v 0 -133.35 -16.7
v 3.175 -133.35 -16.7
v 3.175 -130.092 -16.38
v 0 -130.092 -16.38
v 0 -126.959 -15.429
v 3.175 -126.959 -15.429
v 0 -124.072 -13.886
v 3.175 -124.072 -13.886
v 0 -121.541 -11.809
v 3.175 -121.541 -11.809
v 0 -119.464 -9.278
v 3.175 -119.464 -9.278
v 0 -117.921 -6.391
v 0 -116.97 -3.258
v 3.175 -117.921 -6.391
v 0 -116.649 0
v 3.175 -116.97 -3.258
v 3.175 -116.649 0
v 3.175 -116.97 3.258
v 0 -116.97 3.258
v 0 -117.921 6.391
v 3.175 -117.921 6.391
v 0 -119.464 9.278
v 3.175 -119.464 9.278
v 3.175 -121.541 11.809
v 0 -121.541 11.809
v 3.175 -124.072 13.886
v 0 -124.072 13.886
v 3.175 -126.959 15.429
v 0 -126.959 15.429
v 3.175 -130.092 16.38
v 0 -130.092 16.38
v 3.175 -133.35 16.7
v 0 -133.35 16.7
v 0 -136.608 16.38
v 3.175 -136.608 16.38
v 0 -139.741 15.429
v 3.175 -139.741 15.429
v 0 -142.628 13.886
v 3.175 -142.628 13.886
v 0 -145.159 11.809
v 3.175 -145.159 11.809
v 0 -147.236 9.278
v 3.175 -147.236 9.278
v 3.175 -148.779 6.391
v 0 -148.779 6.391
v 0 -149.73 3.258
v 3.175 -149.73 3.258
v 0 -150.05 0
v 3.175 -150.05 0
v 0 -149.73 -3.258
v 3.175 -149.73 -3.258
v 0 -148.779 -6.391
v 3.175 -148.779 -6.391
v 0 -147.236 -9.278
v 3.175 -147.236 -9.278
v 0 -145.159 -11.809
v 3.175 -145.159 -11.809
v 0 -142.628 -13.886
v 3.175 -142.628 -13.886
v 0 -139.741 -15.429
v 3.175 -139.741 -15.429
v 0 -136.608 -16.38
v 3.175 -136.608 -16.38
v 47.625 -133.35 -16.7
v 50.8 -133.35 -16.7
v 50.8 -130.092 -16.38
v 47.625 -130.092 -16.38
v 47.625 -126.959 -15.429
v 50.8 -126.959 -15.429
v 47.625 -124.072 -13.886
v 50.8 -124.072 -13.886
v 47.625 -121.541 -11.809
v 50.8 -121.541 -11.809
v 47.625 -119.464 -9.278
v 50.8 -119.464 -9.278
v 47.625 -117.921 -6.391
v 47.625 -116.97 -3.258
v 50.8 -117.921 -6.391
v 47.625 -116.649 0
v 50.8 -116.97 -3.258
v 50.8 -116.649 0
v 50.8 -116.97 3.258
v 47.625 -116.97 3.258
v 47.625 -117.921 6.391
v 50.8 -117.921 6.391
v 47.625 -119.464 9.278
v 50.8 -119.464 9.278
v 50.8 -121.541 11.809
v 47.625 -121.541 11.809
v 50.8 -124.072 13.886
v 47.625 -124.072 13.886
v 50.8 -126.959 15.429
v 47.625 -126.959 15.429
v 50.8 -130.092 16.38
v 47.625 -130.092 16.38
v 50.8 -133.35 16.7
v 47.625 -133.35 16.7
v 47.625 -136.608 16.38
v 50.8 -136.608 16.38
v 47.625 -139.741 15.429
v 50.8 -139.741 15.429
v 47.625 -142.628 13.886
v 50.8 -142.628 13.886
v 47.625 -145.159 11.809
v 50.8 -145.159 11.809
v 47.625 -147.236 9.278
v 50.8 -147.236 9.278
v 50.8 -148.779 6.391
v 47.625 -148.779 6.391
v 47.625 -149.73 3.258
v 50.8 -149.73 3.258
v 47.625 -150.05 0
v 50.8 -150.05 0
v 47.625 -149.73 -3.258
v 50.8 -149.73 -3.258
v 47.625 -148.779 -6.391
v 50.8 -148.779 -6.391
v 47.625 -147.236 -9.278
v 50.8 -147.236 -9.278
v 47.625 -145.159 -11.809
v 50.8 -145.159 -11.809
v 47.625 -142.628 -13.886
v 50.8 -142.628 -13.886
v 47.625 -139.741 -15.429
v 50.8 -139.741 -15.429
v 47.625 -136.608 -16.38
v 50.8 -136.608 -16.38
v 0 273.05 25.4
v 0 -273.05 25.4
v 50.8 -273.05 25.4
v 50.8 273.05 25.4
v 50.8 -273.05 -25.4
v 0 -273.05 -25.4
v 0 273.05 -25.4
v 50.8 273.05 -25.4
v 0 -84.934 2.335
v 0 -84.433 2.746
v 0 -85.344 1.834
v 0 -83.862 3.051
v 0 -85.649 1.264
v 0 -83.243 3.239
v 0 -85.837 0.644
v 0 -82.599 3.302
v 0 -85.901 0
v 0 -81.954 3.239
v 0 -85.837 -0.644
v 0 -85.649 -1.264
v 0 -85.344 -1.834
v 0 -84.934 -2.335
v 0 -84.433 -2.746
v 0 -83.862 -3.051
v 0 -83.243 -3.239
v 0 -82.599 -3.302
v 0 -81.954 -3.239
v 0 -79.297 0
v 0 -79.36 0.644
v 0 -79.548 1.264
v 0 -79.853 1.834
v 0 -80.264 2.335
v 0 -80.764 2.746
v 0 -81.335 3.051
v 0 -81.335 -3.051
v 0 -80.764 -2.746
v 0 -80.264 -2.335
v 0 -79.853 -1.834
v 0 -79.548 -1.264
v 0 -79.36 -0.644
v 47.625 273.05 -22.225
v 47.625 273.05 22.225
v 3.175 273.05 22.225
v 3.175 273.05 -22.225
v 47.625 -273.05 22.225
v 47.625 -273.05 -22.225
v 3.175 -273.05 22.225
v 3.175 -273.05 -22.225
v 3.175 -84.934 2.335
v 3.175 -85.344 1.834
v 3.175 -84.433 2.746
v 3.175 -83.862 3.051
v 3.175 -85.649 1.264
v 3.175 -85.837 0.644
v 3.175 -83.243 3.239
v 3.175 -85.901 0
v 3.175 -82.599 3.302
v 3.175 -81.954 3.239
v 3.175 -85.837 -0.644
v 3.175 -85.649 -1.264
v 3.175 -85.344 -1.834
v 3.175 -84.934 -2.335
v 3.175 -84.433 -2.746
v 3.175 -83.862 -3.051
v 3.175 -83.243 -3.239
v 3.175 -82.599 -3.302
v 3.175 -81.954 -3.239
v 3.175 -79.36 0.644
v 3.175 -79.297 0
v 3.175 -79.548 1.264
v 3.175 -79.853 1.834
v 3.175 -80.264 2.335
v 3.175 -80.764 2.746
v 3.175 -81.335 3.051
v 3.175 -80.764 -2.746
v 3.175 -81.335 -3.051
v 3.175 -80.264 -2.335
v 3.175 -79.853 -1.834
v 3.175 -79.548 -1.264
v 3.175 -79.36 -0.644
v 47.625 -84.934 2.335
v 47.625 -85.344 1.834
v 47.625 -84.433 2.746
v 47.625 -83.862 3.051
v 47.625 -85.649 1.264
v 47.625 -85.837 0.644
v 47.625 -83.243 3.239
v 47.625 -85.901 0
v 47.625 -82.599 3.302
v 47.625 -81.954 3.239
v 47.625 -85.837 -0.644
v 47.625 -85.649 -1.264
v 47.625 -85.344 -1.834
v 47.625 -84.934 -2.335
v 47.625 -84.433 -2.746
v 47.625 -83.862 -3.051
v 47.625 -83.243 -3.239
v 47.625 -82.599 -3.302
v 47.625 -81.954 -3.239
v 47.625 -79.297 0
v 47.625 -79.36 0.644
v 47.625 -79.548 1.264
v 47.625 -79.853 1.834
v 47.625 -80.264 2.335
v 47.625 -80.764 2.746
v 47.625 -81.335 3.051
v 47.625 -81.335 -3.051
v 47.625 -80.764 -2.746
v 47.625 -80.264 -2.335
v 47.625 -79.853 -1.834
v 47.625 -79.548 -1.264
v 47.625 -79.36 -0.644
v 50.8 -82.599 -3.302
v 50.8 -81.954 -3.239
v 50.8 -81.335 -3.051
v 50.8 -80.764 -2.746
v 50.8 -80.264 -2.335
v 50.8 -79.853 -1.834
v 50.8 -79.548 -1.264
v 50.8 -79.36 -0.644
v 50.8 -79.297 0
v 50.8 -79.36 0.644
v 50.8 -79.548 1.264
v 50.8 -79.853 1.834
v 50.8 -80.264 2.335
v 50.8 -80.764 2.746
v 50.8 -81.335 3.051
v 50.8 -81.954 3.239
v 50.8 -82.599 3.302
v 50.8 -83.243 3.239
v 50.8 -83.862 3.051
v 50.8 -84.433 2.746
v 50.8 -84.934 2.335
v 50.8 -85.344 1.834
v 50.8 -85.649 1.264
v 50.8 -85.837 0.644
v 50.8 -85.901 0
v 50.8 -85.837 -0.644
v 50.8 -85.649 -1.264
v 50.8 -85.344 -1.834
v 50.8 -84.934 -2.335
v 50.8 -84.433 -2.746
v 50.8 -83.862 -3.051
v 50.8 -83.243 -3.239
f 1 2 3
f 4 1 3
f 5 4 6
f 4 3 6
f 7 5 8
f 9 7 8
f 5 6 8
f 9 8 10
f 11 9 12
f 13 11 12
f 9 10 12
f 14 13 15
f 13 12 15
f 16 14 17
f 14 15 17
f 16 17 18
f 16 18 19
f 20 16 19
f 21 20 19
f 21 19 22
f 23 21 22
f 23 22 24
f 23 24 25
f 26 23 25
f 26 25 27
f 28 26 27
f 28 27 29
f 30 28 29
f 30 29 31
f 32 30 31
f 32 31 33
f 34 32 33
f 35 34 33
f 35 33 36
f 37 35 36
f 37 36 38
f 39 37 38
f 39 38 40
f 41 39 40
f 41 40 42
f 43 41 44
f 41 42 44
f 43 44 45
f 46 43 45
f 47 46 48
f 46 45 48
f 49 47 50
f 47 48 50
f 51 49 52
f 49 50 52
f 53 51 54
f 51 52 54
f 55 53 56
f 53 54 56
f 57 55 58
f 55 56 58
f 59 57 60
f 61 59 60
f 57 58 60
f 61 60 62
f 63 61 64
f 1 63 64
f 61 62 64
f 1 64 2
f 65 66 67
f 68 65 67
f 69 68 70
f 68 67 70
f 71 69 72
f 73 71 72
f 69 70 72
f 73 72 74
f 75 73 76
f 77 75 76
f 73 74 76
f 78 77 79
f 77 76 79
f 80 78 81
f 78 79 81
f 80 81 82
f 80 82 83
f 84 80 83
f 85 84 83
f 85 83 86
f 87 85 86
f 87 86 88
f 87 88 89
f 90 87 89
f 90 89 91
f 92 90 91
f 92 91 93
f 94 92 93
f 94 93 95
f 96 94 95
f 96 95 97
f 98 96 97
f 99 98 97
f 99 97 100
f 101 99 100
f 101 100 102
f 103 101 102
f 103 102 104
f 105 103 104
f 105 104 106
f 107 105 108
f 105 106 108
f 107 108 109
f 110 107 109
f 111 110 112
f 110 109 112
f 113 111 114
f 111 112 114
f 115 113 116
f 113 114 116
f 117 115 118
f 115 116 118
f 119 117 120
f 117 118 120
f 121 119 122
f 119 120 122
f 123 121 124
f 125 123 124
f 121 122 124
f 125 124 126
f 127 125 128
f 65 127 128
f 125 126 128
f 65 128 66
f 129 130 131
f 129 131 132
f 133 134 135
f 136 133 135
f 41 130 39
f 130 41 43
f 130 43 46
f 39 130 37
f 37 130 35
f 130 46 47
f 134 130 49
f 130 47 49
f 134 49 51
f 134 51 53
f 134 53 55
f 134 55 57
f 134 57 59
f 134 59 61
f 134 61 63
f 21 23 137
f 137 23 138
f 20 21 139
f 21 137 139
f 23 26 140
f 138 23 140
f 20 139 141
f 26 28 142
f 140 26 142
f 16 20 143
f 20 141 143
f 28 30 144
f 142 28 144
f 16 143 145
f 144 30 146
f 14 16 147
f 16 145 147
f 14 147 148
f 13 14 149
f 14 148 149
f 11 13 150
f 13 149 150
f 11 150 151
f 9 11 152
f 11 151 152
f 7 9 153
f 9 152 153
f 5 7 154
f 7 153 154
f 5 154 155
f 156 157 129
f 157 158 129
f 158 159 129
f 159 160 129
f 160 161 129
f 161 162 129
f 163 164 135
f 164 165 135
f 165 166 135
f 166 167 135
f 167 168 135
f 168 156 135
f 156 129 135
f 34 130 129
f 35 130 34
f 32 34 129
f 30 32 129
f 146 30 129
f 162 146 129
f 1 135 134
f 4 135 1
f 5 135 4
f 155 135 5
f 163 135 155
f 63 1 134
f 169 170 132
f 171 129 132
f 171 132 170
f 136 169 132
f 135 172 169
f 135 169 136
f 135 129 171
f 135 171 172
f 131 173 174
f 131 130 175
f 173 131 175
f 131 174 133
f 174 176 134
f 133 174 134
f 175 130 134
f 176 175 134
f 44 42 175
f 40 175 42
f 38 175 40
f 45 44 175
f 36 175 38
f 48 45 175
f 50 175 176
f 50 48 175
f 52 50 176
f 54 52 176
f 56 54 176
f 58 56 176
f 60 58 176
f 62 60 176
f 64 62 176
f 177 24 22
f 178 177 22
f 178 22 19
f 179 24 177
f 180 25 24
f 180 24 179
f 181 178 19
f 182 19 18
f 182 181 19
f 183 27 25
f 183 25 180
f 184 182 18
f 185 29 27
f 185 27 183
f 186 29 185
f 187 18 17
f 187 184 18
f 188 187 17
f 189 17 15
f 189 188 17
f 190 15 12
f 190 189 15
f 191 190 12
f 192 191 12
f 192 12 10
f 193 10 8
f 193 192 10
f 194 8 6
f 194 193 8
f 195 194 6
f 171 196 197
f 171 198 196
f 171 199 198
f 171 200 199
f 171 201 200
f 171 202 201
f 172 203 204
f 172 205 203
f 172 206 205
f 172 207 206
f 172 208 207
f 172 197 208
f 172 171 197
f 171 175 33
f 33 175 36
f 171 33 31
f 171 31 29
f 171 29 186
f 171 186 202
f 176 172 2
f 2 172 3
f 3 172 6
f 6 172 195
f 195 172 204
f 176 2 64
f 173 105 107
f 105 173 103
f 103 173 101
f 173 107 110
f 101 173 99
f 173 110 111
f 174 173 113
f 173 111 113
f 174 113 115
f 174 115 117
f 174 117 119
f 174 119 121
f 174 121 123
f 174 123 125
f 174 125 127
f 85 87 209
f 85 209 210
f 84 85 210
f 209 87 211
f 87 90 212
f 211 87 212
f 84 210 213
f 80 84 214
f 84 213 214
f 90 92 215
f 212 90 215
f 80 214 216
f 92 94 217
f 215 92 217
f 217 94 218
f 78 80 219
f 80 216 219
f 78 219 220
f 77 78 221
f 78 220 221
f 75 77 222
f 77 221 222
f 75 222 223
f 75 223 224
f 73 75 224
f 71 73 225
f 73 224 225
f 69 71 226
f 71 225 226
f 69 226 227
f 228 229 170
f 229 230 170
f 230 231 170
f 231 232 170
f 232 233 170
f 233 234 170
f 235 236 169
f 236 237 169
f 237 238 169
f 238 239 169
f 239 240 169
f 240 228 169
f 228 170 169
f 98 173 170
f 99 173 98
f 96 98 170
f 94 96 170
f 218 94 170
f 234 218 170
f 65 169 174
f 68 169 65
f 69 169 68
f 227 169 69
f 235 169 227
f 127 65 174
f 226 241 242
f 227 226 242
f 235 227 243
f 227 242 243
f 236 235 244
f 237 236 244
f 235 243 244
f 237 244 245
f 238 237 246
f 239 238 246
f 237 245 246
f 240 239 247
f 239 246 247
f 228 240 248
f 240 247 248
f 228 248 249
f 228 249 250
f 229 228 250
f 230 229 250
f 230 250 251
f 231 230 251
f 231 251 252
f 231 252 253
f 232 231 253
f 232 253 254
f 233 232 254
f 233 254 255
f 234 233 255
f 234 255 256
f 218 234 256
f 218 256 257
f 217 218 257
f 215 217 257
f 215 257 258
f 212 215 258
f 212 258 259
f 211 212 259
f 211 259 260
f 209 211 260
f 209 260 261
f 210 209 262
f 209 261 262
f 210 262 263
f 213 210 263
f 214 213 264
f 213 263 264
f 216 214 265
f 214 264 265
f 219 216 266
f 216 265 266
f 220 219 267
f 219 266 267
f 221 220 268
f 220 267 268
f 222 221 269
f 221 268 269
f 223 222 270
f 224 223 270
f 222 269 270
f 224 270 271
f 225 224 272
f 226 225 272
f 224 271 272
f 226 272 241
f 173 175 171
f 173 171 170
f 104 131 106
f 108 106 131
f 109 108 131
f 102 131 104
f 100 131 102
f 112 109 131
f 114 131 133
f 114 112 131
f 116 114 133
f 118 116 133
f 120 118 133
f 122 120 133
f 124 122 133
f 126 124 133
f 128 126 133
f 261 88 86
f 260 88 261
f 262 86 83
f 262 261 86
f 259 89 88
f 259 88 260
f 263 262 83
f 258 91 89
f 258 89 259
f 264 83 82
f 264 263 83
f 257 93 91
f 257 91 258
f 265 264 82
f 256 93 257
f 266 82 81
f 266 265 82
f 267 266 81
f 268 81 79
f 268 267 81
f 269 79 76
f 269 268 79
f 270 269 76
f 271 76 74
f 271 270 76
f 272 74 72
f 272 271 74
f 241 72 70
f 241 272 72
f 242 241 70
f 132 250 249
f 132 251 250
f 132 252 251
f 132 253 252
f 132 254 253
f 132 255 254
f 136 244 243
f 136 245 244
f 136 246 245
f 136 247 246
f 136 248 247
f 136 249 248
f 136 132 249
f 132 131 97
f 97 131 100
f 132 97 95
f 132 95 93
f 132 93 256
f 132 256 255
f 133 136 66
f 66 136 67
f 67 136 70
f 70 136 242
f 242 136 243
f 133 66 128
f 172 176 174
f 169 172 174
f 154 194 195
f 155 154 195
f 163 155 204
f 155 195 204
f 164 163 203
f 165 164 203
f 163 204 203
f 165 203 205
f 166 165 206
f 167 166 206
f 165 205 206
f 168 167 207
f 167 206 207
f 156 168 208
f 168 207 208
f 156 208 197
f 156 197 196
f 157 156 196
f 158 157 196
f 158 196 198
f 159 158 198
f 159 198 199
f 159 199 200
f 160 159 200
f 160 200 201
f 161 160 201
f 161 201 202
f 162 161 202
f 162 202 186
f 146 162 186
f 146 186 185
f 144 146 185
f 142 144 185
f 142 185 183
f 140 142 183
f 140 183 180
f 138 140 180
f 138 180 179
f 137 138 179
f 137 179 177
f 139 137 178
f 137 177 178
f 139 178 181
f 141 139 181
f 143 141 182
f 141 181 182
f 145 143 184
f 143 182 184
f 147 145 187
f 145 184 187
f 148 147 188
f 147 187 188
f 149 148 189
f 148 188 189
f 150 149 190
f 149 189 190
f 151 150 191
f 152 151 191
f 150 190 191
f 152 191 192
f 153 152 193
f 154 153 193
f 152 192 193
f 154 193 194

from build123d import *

# Parameters (mm, degrees)
SKETCH1_W           = 50.8
SKETCH1_H           = 546.1
BOSS_EXTRUDE1_DEPTH = 50.8
SKETCH2_W           = 44.45
SKETCH2_H           = 44.45
CUT_EXTRUDE1_DEPTH  = 547.1
SKETCH4_R           = 16.7005
SKETCH4_R_2         = 3.302
CUT_EXTRUDE2_DEPTH  = 51.8


with BuildPart() as part:
    # Sketch1 → Boss-Extrude1 (new body)
    with BuildSketch(Plane(origin=(0, 0, 0), x_dir=(0, 0, -1), z_dir=(1, 0, 0))):
        Rectangle(SKETCH1_W, SKETCH1_H)
    extrude(amount=BOSS_EXTRUDE1_DEPTH)

    # Sketch2 → Cut-Extrude1 (cut, through all)
    with BuildSketch(Plane(origin=(0, 273.05, 0), x_dir=(1, 0, 0), z_dir=(0, 1, 0))):
        with Locations((25.4, 0)):
            Rectangle(SKETCH2_W, SKETCH2_H)
    extrude(amount=-CUT_EXTRUDE1_DEPTH, mode=Mode.SUBTRACT)

    # Sketch4 → Cut-Extrude2 (cut, through all)
    with BuildSketch(Plane(origin=(50.8, 0, 0), x_dir=(0, 0, -1), z_dir=(1, 0, 0))):
        with Locations((0, -133.35)):
            Circle(SKETCH4_R)
        with Locations((0, -82.598640474)):
            Circle(SKETCH4_R_2)
    extrude(amount=-CUT_EXTRUDE2_DEPTH, mode=Mode.SUBTRACT)


solid = part.part
